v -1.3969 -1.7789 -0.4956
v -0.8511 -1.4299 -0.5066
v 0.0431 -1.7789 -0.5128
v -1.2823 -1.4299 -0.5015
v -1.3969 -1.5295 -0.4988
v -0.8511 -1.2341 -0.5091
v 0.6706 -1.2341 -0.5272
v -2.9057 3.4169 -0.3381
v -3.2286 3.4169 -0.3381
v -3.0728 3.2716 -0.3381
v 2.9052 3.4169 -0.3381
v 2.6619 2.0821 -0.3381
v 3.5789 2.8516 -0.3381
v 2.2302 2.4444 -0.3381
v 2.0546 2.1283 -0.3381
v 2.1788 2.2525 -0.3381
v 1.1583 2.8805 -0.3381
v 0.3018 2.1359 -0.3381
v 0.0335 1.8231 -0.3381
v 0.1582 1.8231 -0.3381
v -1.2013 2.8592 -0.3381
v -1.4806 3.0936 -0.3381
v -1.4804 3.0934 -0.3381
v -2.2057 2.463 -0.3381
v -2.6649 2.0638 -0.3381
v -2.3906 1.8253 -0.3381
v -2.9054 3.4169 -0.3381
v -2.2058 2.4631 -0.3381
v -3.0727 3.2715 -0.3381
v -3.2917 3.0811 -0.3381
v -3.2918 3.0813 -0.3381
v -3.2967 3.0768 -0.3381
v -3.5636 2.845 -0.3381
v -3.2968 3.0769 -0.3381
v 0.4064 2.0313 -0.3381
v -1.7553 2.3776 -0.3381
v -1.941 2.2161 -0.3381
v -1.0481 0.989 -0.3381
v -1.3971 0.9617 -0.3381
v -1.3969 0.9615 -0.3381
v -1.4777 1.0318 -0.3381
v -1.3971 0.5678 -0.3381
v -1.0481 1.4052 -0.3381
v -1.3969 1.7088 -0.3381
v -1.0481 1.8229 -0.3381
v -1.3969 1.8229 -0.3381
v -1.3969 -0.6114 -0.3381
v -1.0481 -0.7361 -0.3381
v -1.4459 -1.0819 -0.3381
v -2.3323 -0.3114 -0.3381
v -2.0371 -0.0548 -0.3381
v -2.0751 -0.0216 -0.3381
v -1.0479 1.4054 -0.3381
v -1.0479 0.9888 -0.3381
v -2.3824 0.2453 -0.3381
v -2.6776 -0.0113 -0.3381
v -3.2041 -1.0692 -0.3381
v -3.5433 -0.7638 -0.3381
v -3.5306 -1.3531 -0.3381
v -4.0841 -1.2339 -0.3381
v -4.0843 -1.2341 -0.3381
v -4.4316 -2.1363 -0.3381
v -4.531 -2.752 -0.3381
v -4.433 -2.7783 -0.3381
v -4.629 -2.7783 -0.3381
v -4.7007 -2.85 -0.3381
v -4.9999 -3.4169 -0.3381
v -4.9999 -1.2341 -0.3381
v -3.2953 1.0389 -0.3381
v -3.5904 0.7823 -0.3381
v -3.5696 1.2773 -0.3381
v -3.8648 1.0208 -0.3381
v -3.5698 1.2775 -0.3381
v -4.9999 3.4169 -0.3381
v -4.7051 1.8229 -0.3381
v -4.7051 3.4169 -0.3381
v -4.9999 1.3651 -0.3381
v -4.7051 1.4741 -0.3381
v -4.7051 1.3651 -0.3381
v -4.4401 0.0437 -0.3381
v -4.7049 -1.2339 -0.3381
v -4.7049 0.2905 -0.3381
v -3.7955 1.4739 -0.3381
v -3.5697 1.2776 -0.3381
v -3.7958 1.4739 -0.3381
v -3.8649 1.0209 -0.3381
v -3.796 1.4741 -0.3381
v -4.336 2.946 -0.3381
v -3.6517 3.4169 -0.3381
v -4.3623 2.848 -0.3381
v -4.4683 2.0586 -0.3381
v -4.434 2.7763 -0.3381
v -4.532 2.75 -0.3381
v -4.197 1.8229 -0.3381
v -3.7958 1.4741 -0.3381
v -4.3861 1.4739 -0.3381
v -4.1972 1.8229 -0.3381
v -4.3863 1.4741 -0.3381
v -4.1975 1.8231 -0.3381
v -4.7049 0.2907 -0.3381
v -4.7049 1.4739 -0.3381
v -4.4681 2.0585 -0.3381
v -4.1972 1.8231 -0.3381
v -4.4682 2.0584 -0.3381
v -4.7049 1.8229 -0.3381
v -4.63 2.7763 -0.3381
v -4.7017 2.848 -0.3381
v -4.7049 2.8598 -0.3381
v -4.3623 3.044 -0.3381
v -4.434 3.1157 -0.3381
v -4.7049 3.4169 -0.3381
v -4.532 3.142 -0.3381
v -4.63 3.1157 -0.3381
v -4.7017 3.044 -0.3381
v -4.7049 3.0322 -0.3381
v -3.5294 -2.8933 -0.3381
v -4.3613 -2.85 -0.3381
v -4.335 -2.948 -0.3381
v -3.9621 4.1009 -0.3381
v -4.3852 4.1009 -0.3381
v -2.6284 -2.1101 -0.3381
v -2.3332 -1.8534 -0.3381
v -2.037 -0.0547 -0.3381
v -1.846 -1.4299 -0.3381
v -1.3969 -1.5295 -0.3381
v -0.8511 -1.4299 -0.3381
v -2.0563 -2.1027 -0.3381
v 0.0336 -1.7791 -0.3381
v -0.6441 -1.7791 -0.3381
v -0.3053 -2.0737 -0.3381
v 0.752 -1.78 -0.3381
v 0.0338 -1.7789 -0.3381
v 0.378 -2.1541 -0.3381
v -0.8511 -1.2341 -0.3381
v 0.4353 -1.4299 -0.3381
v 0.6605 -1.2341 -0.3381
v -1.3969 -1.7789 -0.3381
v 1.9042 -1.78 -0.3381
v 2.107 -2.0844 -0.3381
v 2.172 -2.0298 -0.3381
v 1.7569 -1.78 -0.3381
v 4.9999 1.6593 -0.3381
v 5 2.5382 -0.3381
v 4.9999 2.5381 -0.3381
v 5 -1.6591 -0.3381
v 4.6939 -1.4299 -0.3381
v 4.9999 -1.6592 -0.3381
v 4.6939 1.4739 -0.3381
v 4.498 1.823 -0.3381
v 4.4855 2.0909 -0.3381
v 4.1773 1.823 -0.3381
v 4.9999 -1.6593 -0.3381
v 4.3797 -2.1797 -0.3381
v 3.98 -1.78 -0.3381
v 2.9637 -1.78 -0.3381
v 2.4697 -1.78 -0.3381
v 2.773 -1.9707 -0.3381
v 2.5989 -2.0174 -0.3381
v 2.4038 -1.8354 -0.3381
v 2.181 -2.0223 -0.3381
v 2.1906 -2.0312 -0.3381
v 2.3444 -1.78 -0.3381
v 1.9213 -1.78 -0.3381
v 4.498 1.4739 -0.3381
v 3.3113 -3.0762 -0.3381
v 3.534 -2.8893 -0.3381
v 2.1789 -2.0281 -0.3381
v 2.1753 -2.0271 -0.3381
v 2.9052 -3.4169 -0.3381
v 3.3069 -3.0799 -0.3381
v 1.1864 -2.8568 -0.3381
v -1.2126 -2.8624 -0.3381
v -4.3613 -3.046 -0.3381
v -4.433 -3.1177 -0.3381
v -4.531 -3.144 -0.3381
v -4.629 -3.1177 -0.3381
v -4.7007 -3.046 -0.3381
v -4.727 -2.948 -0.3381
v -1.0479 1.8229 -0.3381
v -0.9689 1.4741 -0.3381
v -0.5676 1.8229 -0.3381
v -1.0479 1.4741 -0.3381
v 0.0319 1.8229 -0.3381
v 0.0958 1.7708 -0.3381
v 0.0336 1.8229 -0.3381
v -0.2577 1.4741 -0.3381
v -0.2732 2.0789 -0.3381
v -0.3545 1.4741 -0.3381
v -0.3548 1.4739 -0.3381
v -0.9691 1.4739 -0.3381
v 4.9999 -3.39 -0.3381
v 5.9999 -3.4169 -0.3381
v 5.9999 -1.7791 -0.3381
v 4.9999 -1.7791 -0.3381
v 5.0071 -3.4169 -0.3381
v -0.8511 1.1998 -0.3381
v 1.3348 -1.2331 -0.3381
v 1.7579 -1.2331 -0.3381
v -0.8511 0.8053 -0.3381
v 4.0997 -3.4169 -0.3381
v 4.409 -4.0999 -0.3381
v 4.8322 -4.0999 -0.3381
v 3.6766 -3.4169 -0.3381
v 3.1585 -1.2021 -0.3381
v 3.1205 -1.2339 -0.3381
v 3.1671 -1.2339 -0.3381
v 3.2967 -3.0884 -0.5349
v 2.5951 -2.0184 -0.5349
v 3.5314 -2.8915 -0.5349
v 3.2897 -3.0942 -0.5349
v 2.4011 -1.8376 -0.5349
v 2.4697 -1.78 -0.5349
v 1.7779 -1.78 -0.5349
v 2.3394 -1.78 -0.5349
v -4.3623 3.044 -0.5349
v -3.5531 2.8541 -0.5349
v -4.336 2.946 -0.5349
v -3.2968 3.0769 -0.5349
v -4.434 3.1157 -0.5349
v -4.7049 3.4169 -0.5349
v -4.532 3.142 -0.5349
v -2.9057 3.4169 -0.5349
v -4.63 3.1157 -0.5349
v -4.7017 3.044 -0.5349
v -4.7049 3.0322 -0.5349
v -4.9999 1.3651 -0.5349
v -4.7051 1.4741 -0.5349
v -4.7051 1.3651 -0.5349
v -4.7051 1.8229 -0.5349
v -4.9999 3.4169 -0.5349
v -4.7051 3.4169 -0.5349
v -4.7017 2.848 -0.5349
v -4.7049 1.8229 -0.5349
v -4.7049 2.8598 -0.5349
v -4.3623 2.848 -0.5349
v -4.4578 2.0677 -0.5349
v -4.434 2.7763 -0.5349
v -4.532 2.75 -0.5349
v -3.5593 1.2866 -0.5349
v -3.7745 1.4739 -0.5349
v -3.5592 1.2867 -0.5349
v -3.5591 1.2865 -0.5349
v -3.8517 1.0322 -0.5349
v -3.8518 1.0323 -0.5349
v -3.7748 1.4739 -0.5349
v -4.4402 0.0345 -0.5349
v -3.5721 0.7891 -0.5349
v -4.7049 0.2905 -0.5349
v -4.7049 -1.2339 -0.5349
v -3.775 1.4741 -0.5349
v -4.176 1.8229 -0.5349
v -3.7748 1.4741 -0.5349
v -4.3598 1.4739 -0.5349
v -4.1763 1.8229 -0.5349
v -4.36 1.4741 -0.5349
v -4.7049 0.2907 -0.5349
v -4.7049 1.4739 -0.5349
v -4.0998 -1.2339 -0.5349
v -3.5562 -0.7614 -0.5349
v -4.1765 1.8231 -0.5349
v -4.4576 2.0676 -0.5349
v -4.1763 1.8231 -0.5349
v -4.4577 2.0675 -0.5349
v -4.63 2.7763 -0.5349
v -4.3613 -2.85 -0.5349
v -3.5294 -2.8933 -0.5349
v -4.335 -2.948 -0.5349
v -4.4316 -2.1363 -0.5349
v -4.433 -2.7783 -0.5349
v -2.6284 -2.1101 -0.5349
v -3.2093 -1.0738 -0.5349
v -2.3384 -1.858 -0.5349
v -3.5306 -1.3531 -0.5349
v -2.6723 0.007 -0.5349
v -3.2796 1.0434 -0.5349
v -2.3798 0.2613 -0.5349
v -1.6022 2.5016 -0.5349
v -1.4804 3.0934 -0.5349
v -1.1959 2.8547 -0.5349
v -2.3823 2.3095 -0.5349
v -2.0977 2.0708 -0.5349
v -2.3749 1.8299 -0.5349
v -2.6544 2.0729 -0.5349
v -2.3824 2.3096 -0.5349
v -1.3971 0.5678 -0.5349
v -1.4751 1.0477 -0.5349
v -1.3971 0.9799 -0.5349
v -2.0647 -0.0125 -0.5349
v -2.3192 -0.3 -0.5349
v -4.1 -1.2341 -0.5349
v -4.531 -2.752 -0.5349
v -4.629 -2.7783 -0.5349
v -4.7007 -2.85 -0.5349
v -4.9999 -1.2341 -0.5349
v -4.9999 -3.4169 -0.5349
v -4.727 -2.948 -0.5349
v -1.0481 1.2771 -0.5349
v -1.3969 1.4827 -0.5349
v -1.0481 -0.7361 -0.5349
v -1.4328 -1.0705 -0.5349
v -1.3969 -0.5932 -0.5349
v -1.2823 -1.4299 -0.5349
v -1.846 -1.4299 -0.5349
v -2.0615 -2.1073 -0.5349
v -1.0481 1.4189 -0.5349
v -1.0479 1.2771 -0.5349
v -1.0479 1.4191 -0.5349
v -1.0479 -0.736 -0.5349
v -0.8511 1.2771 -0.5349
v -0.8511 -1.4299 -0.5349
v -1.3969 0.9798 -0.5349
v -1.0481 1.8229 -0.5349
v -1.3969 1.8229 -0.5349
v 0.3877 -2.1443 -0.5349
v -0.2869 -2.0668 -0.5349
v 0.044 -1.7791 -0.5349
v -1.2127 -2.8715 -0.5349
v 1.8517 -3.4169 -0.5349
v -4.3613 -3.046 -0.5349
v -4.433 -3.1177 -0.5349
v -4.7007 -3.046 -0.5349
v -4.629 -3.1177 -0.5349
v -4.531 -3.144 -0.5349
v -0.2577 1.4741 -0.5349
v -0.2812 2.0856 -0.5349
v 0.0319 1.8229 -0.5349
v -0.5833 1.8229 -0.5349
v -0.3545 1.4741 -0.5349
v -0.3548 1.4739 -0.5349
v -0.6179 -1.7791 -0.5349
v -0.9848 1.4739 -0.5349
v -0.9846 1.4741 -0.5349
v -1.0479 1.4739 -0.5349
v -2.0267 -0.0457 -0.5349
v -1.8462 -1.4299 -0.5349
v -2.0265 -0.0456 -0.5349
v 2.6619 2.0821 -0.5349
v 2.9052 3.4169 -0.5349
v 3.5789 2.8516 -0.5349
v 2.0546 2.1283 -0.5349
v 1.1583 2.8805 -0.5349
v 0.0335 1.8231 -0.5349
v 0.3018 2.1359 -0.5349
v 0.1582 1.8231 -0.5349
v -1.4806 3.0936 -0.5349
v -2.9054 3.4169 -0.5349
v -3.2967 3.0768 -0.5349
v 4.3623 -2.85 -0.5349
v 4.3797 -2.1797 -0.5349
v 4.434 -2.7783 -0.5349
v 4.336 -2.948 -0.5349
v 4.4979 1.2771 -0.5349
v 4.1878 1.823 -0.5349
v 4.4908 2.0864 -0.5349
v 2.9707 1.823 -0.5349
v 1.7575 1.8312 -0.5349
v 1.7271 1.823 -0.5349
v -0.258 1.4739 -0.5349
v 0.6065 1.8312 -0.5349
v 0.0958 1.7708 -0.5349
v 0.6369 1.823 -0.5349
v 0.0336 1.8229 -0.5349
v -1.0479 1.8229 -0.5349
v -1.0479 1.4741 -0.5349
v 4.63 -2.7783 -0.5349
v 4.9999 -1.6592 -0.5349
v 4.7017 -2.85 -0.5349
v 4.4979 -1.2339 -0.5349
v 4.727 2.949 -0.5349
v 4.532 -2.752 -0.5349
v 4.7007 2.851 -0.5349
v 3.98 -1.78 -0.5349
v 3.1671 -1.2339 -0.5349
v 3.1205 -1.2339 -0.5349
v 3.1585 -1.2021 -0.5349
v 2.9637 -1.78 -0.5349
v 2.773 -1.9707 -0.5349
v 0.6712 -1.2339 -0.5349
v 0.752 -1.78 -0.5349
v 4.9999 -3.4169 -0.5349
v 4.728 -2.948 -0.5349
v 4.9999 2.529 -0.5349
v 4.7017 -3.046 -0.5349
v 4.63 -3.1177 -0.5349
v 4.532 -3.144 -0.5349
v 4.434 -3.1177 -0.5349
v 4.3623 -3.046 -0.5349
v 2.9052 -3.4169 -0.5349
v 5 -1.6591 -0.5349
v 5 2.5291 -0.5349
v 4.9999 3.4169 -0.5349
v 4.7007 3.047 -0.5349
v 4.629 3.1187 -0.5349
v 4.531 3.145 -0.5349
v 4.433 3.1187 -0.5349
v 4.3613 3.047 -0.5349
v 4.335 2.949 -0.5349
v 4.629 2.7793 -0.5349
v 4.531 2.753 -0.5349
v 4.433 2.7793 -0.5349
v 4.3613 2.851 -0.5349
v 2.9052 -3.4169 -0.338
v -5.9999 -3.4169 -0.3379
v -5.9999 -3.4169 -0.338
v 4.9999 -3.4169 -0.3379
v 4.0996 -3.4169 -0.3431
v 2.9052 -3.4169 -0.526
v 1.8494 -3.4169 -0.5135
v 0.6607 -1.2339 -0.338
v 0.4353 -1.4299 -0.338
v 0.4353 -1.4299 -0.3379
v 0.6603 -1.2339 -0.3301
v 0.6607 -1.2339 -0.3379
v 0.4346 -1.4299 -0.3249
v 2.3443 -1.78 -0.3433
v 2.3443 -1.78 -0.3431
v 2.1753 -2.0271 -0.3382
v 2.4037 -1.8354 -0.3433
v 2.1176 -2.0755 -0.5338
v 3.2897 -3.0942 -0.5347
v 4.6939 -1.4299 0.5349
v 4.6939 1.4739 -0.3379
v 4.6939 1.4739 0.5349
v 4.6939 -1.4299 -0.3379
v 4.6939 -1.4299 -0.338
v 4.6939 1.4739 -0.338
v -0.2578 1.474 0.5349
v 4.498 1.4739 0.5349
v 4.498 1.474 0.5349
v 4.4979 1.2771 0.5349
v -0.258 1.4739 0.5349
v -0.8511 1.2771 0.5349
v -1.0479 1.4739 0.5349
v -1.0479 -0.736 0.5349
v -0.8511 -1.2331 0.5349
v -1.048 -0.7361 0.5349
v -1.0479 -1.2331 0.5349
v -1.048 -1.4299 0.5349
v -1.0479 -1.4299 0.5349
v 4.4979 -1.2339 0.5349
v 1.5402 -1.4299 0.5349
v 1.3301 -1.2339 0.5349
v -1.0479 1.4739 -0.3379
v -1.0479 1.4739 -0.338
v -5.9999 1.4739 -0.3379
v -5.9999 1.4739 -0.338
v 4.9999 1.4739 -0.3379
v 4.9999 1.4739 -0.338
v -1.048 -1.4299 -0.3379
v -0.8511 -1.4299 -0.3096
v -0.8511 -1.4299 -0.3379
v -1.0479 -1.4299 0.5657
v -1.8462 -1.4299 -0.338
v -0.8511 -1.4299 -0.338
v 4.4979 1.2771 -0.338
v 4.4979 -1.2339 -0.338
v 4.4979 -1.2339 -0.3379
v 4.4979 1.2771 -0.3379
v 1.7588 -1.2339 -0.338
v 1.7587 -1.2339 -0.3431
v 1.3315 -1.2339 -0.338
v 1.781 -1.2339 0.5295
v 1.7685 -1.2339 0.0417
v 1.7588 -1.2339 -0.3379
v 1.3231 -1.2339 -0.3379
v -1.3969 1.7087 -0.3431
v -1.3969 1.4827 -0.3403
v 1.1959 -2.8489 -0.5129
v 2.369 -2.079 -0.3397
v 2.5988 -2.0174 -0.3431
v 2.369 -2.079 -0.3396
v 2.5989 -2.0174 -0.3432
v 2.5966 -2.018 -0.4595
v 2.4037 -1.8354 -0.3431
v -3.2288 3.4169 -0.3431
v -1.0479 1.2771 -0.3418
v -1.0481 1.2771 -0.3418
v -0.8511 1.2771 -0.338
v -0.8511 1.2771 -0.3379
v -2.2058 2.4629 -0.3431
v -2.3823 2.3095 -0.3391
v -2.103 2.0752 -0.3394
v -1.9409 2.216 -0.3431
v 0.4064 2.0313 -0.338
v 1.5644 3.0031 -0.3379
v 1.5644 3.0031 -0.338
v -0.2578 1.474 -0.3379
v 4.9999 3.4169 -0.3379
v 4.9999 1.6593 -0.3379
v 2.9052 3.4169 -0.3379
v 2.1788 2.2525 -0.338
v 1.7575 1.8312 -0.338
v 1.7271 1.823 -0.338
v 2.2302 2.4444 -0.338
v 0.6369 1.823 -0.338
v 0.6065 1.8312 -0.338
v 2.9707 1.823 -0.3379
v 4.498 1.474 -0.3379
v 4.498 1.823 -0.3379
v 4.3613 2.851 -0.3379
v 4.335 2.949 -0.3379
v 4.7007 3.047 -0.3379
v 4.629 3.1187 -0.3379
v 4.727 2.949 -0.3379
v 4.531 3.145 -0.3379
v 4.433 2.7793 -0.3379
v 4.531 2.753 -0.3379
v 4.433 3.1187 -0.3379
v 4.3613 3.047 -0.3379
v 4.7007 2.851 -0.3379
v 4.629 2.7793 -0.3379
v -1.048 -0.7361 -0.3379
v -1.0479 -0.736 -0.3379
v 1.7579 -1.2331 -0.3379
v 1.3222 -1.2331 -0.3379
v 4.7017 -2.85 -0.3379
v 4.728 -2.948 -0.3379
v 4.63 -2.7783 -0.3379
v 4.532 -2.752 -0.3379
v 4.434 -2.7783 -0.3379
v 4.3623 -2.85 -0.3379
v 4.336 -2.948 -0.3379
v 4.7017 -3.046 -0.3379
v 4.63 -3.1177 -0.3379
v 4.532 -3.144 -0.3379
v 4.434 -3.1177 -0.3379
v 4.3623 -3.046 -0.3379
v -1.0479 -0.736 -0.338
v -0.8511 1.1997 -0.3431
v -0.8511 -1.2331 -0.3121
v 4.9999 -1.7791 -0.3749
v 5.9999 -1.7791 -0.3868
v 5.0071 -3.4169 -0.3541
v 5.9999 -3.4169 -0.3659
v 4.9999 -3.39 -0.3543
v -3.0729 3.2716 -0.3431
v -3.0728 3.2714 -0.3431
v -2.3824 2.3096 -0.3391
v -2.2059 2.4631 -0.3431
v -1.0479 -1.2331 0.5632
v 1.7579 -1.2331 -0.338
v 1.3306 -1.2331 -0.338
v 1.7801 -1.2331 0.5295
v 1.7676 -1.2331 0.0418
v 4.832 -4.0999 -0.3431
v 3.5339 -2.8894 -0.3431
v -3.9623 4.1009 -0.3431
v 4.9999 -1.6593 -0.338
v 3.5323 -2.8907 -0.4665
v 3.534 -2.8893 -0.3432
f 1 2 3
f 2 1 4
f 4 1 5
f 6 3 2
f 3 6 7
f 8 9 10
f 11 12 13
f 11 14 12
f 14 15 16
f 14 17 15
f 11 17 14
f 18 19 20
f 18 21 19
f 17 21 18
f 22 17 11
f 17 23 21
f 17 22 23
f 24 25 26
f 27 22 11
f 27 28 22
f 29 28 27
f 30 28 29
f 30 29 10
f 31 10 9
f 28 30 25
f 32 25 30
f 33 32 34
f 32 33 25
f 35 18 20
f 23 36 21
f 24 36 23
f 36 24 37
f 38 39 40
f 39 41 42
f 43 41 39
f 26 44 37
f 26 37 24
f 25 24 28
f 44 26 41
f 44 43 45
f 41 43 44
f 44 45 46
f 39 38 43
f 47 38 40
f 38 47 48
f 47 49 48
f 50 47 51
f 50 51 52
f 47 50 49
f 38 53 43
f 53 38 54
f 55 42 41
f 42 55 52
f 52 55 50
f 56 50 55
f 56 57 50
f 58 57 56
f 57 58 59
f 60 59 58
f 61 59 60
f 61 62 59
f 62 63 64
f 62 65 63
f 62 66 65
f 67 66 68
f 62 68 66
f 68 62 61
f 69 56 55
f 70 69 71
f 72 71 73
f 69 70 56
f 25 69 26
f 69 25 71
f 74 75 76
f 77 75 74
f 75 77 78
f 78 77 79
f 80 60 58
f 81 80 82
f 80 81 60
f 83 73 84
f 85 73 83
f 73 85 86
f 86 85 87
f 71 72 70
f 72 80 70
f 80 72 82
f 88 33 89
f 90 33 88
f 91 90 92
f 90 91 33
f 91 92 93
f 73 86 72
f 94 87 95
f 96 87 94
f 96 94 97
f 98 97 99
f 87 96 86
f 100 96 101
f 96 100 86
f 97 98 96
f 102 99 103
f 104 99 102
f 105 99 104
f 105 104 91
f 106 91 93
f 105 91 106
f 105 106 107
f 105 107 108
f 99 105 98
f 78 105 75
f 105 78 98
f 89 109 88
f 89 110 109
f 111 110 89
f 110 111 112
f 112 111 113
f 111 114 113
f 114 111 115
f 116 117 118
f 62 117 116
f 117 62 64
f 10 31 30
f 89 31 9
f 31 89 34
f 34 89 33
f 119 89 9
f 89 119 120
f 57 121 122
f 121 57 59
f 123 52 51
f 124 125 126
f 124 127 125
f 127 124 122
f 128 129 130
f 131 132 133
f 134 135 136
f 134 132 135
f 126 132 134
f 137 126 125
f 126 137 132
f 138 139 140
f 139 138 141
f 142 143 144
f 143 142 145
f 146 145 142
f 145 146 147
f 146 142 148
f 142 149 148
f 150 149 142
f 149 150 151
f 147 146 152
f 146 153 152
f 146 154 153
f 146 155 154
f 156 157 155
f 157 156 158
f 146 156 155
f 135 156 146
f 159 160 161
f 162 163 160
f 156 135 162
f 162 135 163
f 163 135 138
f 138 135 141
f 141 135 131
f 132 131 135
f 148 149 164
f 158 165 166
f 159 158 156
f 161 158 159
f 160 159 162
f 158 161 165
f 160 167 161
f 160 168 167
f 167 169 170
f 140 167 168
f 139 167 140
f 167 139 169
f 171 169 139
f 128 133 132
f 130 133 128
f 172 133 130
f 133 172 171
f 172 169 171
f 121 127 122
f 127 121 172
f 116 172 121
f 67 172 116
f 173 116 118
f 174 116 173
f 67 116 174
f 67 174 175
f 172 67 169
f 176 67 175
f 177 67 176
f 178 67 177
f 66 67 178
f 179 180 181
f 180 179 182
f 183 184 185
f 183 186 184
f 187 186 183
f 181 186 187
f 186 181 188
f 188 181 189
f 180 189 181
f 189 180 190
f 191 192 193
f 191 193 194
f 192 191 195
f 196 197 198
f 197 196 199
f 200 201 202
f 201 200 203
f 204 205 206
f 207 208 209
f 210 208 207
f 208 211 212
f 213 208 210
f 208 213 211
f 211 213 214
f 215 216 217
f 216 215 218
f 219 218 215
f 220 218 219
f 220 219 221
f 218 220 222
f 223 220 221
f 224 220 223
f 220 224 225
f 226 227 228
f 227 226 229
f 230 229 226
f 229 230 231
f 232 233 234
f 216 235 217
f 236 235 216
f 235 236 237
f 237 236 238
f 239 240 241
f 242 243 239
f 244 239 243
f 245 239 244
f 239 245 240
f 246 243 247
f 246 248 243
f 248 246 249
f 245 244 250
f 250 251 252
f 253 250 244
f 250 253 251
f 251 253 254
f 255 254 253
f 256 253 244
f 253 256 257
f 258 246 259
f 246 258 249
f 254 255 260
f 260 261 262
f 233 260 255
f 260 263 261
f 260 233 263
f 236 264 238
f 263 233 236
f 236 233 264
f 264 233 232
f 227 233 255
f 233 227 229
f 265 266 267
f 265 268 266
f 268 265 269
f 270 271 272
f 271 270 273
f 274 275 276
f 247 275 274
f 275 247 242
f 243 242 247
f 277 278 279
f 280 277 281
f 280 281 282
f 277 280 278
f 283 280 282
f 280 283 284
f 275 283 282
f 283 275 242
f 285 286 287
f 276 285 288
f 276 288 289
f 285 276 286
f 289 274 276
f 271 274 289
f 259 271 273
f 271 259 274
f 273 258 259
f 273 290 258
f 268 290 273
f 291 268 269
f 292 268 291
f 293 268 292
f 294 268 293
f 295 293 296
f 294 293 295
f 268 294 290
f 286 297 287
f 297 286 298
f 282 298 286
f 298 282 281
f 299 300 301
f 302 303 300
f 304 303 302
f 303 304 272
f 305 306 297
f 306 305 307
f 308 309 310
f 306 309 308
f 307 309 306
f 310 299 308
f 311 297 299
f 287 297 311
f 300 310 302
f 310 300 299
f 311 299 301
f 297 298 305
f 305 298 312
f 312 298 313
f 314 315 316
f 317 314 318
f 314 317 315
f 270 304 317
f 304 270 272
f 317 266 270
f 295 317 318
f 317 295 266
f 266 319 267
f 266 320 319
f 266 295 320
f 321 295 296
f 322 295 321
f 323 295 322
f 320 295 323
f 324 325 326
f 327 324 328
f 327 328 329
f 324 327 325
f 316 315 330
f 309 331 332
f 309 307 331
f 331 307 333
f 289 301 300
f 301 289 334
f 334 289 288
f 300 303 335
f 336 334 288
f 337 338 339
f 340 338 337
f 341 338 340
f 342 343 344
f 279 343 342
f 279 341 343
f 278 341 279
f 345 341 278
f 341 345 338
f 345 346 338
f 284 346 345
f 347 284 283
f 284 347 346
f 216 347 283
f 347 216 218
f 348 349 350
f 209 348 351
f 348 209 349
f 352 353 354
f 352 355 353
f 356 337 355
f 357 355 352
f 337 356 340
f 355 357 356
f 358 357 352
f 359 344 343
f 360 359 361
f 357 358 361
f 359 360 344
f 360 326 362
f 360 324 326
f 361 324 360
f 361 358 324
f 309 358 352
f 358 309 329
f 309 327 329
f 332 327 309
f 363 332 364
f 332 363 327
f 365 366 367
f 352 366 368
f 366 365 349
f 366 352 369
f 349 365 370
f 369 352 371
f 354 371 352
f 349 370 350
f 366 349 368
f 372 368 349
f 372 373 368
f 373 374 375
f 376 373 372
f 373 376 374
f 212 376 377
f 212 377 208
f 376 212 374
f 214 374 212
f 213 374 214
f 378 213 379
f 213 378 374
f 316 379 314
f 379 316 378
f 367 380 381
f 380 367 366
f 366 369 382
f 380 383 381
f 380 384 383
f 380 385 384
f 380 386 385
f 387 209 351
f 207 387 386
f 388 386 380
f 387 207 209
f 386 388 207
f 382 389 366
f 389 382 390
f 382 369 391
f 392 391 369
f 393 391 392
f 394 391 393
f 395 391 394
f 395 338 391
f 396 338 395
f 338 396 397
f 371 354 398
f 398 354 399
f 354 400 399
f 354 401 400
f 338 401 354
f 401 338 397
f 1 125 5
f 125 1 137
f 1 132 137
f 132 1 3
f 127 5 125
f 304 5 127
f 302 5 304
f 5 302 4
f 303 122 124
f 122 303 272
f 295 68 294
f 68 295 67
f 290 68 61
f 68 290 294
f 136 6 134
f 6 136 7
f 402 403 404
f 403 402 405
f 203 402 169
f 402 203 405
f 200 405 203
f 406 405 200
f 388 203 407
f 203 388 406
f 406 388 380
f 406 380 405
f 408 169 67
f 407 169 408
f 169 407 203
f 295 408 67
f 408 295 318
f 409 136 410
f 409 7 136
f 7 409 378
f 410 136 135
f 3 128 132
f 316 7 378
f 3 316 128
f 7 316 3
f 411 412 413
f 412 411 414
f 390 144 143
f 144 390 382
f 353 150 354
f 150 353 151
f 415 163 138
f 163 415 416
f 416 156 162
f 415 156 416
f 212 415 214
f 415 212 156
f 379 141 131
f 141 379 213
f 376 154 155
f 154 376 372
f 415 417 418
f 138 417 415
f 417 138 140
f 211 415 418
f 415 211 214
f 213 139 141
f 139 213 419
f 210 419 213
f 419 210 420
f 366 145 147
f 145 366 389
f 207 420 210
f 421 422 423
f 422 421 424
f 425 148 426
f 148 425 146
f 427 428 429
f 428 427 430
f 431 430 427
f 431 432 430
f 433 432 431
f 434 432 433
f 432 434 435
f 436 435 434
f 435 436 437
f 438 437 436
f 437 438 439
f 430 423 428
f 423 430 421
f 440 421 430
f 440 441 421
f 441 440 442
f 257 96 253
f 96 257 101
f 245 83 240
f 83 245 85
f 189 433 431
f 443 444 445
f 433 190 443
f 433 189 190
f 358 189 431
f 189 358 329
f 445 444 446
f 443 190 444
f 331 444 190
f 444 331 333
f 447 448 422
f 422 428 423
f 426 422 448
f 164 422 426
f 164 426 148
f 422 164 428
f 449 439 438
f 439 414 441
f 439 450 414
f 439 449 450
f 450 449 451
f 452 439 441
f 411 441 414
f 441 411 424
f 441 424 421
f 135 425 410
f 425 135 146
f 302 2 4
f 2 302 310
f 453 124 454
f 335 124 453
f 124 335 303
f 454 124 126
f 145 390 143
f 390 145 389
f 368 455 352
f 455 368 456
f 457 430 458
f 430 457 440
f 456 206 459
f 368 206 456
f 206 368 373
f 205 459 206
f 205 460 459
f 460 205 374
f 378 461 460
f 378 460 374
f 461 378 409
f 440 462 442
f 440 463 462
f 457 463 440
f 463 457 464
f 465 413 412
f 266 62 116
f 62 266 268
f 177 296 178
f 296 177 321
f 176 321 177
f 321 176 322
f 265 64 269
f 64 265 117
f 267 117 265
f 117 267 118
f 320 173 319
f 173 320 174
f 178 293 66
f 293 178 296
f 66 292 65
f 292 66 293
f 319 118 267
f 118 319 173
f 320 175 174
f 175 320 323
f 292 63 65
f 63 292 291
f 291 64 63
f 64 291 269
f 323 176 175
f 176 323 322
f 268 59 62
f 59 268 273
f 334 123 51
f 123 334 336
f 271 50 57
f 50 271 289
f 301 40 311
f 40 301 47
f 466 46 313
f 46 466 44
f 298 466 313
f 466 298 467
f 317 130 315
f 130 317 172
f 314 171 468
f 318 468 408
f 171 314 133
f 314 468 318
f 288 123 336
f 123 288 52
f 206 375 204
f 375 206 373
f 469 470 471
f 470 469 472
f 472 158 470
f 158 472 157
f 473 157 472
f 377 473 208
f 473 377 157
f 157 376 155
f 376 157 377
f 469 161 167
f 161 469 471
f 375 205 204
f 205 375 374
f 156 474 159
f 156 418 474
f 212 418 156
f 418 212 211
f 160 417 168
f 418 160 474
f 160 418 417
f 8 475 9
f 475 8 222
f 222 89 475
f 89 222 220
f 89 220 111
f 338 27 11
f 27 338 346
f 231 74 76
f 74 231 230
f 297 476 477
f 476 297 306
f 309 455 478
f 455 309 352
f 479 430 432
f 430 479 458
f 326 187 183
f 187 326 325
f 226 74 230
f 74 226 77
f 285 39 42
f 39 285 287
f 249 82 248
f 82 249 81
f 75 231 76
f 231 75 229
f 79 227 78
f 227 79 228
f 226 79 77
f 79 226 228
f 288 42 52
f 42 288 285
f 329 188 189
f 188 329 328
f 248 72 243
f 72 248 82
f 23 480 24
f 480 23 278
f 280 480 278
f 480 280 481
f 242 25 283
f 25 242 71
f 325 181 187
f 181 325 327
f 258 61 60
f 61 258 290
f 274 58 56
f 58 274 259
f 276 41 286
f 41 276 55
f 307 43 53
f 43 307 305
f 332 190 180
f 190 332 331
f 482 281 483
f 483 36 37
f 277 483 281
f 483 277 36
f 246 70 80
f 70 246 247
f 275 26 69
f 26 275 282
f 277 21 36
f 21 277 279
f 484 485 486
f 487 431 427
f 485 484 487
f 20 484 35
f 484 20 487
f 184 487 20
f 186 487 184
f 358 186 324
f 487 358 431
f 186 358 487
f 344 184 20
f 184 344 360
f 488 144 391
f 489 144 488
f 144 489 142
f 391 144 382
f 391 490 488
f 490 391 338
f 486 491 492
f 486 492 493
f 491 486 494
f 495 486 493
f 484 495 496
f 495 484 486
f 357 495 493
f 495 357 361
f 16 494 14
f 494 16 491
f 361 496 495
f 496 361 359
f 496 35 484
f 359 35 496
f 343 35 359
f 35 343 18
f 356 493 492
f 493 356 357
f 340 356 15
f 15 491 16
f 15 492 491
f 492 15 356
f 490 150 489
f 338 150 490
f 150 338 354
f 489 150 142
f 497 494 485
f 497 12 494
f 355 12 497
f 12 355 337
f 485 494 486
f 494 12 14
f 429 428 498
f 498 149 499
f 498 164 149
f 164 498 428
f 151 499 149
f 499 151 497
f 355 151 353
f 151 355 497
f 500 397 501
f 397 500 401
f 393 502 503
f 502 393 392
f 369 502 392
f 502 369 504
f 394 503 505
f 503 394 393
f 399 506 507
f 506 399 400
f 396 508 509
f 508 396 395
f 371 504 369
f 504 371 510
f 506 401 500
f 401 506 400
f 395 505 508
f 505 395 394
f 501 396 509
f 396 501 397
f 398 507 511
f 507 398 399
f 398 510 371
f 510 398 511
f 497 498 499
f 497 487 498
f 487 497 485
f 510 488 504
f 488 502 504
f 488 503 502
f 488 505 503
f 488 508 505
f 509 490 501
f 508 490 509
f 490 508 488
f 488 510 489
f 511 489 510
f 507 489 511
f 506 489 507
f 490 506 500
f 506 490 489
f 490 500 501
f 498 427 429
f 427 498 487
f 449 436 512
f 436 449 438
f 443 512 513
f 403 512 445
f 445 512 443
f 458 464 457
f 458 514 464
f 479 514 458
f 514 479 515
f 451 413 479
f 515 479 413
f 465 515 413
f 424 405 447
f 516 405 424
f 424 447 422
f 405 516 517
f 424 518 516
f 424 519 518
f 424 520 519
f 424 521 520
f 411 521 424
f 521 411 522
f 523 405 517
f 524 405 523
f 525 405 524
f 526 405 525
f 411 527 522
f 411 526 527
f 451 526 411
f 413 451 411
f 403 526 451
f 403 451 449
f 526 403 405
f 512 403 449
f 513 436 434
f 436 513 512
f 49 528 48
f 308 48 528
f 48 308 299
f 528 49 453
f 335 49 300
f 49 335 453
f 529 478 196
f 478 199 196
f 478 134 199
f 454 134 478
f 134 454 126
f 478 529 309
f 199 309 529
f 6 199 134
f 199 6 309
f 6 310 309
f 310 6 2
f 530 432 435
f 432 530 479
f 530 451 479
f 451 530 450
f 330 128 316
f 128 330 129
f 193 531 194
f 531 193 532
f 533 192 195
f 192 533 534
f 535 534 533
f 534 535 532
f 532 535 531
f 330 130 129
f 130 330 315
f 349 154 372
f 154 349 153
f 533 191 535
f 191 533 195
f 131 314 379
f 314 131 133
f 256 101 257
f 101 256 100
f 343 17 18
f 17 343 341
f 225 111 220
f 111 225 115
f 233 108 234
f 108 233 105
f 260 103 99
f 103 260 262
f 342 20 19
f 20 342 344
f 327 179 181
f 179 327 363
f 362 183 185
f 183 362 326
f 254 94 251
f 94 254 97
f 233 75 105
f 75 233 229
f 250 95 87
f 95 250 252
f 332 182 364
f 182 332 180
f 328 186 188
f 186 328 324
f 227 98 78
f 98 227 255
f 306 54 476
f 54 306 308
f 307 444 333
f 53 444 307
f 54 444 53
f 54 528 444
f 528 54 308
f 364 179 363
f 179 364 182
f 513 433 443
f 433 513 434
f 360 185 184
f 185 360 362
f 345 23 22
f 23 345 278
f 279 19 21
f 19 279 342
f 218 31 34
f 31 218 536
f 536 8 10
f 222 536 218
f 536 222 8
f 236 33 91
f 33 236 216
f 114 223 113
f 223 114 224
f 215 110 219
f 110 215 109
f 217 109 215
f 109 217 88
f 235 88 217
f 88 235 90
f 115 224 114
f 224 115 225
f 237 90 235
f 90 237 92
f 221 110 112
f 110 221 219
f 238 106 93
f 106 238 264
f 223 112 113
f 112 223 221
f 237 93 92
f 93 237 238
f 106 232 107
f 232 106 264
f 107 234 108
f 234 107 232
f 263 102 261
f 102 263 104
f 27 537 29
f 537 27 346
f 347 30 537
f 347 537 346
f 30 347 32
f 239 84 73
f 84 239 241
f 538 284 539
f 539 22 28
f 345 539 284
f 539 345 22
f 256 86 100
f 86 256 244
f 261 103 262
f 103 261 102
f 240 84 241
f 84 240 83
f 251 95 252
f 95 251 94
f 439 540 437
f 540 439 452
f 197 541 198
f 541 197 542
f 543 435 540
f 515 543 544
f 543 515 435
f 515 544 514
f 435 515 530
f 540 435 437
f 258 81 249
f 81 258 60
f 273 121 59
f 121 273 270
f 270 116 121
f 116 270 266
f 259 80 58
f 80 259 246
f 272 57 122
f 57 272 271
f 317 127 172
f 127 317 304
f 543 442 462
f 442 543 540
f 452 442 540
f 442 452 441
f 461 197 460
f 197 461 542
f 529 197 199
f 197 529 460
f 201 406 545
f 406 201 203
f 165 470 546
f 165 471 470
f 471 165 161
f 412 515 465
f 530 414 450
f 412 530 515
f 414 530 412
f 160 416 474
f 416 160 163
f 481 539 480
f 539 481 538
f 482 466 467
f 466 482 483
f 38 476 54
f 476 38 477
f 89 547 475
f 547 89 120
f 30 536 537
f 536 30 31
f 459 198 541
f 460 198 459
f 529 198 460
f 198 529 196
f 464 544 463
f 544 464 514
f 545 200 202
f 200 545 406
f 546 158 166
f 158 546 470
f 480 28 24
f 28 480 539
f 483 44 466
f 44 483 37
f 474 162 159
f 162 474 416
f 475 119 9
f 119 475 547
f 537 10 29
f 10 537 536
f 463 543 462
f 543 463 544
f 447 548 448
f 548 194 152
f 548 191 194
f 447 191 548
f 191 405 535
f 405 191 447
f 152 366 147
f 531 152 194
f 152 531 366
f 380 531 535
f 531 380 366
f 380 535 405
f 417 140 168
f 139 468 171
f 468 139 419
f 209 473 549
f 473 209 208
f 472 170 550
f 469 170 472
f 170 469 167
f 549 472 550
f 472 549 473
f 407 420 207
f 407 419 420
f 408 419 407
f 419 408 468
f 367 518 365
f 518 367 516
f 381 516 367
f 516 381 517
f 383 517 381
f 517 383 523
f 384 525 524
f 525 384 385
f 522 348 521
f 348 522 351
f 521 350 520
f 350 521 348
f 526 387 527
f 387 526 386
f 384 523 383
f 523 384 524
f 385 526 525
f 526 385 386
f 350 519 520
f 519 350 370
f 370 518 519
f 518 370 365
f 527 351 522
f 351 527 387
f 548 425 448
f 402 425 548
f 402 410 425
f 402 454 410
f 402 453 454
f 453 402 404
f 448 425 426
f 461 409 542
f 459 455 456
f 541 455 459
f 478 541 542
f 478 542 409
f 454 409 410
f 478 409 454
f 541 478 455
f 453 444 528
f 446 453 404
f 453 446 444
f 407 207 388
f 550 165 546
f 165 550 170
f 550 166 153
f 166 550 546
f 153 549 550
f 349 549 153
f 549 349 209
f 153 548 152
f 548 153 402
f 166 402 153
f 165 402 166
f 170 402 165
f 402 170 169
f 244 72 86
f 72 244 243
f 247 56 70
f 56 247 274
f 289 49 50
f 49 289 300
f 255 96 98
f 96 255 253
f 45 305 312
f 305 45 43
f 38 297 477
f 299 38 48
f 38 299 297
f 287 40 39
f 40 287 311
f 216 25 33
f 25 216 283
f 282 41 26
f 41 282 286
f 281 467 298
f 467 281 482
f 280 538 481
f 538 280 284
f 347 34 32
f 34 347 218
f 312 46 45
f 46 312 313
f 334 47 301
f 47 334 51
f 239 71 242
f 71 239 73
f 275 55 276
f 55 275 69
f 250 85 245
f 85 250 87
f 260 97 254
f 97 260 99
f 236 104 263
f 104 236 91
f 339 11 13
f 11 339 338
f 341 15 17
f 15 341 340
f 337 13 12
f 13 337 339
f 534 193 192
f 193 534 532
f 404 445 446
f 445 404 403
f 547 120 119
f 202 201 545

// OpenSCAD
intersection() {
  translate([0, 0.0005, 0])
  cube(size = [11.9998, 8.2008, 1.2838], center = true);

  union() {
    intersection() {
      translate([6.55, -2.3255, -0.4365])
      cube(size = [23.0998, 2.1828, 0.1968], center = true);
    
      union() {
        translate([-6.36213, 7.3188, -8.7825])
        rotate([-180, 0, 41])
        cube(size = [36.1998, 16.8048, 18.6348], center = true);
      
        intersection() {
          translate([-6.07303, -6.51253, -0.281133])
          rotate([-1, 0, -43])
          cube(size = [36.1998, 18.4028, 0.1968], center = true);
        
          translate([8.3515, -1.506, -0.4365])
          cube(size = [19.4968, 0.5458, 0.1968], center = true);
        }
      
        translate([0.0347711, -0.0399996, -9.219])
        rotate([-180, 0, 41])
        cube(size = [36.1998, 0.3698, 17.7618], center = true);
      }
    }
  
    intersection() {
      union() {
        difference() {
          translate([6.37694, -7.33583, 0.339433])
          rotate([178, 0, 41])
          cube(size = [36.1998, 16.7478, 36.1998], center = true);
        
          translate([-6.55, -9.94, -8.7825])
          cube(size = [23.0999, 16.3199, 18.6349], center = true);
        }
      
        intersection() {
          translate([-6.17757, -6.62463, -9.0623])
          rotate([-1, 0, -43])
          cube(size = [36.1998, 18.4028, 17.7618], center = true);
        
          translate([5.85252, 6.73255, 0.623797])
          rotate([4, 0, -41])
          cube(size = [36.1998, 18.3128, 36.1998], center = true);
        }
      }
    
      difference() {
        union() {
          translate([1.47873, -1.76229, -0.4365])
          rotate([-180, 0, 40])
          cube(size = [36.1998, 4.3688, 0.1968], center = true);
        
          translate([-6.703, 0.022, 0])
          cube(size = [22.7938, 2.9038, 1.0698], center = true);
        }
      
        union() {
          translate([11.55, 0, 0])
          cube(size = [13.0999, 6.8339, 1.0699], center = true);
        
          translate([-6.801, 0.2945, 0])
          cube(size = [22.5979, 3.0569, 1.0699], center = true);
        }
      }
    }
  
    intersection() {
      union() {
        translate([-0.888632, 1.02225, -0.4365])
        rotate([-180, 0, 41])
        cube(size = [36.1998, 0.1188, 0.1968], center = true);
      
        translate([8.3515, 0, -0.4365])
        cube(size = [19.4968, 36.1998, 0.1968], center = true);
      
        difference() {
          translate([-7.25868, -8.65056, -0.4365])
          rotate([0, 0, -40])
          cube(size = [36.1998, 13.6148, 0.1968], center = true);
        
          translate([-4.531, -2.948, -0.4365])
          cylinder(h = 0.1969, r1 = 0.196, r2 = 0.196, center = true, $fn = 12);
        }
      }
    
      union() {
        translate([6.37694, -7.33583, 0.339433])
        rotate([178, 0, 41])
        cube(size = [36.1998, 16.7478, 36.1998], center = true);
      
        translate([-0.506806, 0.583013, 1.11022e-16])
        rotate([-180, 0, 41])
        cube(size = [36.1998, 1.2828, 1.0698], center = true);
      }
    
      difference() {
        translate([6.55, 7.3415, -8.7825])
        cube(size = [23.0998, 21.5168, 18.6348], center = true);
      
        translate([5.4654, 6.28723, 0.582536])
        rotate([4, 0, -41])
        cube(size = [36.1999, 19.4979, 36.1999], center = true);
      }
    }
  
    intersection() {
      translate([2.369, -1.271, -0.4365])
      cylinder(h = 0.1968, r1 = 0.808, r2 = 0.808, center = true, $fn = 12);
    
      translate([2.38988, -2.84815, 8.7825])
      rotate([-180, 0, 40])
      cube(size = [36.1998, 1.5338, 18.6348], center = true);
    }
  
    intersection() {
      union() {
        translate([-2.926, 2.347, -0.4365])
        cube(size = [4.1478, 2.1398, 0.1968], center = true);
      
        intersection() {
          translate([6.6975, 2.347, -0.4365])
          cube(size = [22.8048, 2.1398, 0.1968], center = true);
        
          translate([0.531907, 0.633902, -9.219])
          rotate([0, 0, -40])
          cube(size = [36.1998, 1.1788, 17.7618], center = true);
        }
      
        translate([-3.051, -7.3415, -0.4365])
        cube(size = [3.3078, 21.5168, 0.1968], center = true);
      }
    
      difference() {
        union() {
          translate([-4.8525, 2.391, 8.7825])
          cube(size = [0.2948, 2.0518, 18.6348], center = true);
        
          translate([-1.52567, 1.75508, 3.33067e-16])
          rotate([-180, 0, 41])
          cube(size = [36.1998, 1.9608, 1.0698], center = true);
        }
      
        intersection() {
          translate([-6.49526, 7.47194, 0.518859])
          rotate([-177, 1.20742e-06, 41])
          cube(size = [36.1999, 16.3719, 36.1999], center = true);
        
          translate([4.96465, -5.71118, 0.264259])
          rotate([178, 0, 41])
          cube(size = [36.1999, 21.0559, 36.1999], center = true);
        }
      }
    }
  
    difference() {
      difference() {
        intersection() {
          translate([1.02557, -1.22222, -2.22045e-16])
          rotate([-180, 0, 40])
          cube(size = [36.1998, 5.7808, 1.0698], center = true);
        
          translate([-6.55, 2.347, 8.7825])
          cube(size = [23.0998, 2.1398, 18.6348], center = true);
        }
      
        intersection() {
          translate([-6.55, 2.62, -0.4365])
          cube(size = [23.0999, 1.5939, 0.1969], center = true);
        
          translate([1.182, 2.828, 0])
          cylinder(h = 1.0699, r1 = 1.151, r2 = 1.151, center = true, $fn = 12);
        }
      }
    
      union() {
        difference() {
          translate([2.50398, 2.98413, -8.7825])
          rotate([0, 0, -40])
          cube(size = [36.1999, 1.1789, 18.6349], center = true);
        
          translate([-6.801, -0.797, 0])
          cube(size = [22.598, 5.24, 1.07], center = true);
        }
      
        translate([4.531, 2.949, 0])
        cylinder(h = 36.1999, r1 = 0.196, r2 = 0.196, center = true, $fn = 12);
      
        translate([-6.55, 2.4455, 8.881])
        cube(size = [23.0999, 1.9429, 18.4379], center = true);
      }
    }
  
    difference() {
      translate([-2.778, 8.335, 0])
      cube(size = [3.8538, 19.5298, 1.0698], center = true);
    
      union() {
        translate([-2.8765, 7.3415, 0.0985])
        cube(size = [3.6569, 21.5169, 0.8729], center = true);
      
        translate([-5.98063, 6.87993, 1.11022e-15])
        rotate([-180, 0, 41])
        cube(size = [36.1999, 17.9679, 1.0699], center = true);
      }
    }
  
    difference() {
      difference() {
        translate([6.6975, -2.598, -0.4365])
        cube(size = [22.8048, 1.6378, 0.1968], center = true);
      
        translate([6.26892, 6.72259, -0.597013])
        rotate([-1, 0, -43])
        cube(size = [36.1999, 17.7959, 0.1969], center = true);
      }
    
      union() {
        translate([-6.49903, -7.47627, -0.866677])
        rotate([5, 0, -41])
        cube(size = [36.1999, 16.3119, 36.1999], center = true);
      
        translate([2.366, -3.98, -9.219])
        cylinder(h = 17.7619, r1 = 2.792, r2 = 2.792, center = true, $fn = 12);
      }
    }
  
    intersection() {
      union() {
        translate([6.55, 1.6485, -0.4365])
        cube(size = [23.0998, 0.3488, 0.1968], center = true);
      
        intersection() {
          translate([6.6975, -8.313, 0])
          cube(size = [22.8048, 19.5738, 1.0698], center = true);
        
          translate([4.46612, -5.13769, 8.7825])
          rotate([-180, 0, 41])
          cube(size = [36.1998, 22.5848, 18.6348], center = true);
        }
      
        difference() {
          translate([6.6975, 2.62, -8.7825])
          cube(size = [22.8048, 1.5938, 18.6348], center = true);
        
          difference() {
            translate([1.182, 2.828, 0])
            cylinder(h = 36.1999, r1 = 1.151, r2 = 1.151, center = true, $fn = 12);
          
            translate([-6.40117, 7.3637, -9.219])
            rotate([-180, 0, 41])
            cube(size = [36.2, 16.686, 17.762], center = true);
          }
        }
      }
    
      union() {
        difference() {
          translate([8.526, 1.55, 8.7825])
          cube(size = [19.1478, 0.5458, 18.6348], center = true);
        
          translate([6.27296, 7.47583, 8.7825])
          rotate([0, 0, -40])
          cube(size = [36.1999, 16.6819, 18.6349], center = true);
        }
      
        difference() {
          union() {
            translate([1.51826, 1.8094, -0.4365])
            rotate([0, 0, -40])
            cube(size = [36.1998, 1.8878, 0.1968], center = true);
          
            translate([-7.40855, 8.52256, -0.4365])
            rotate([-180, 0, 41])
            cube(size = [36.1998, 13.6148, 0.1968], center = true);
          }
        
          union() {
            translate([-4.532, 2.946, 8.7825])
            cylinder(h = 18.6349, r1 = 0.196, r2 = 0.196, center = true, $fn = 12);
          
            translate([8.3515, -8.1385, -0.4365])
            cube(size = [19.4969, 19.9229, 0.1969], center = true);
          }
        }
      
        difference() {
          translate([-2.55568, 2.93997, -0.4365])
          rotate([-180, 0, 41])
          cube(size = [36.1998, 1.1788, 0.1968], center = true);
        
          translate([-0.527168, -0.606438, -0.0561888])
          rotate([4, 0, -41])
          cube(size = [36.1999, 1.1849, 36.1999], center = true);
        }
      }
    }
  
    intersection() {
      union() {
        translate([8.526, -1.3315, 0])
        cube(size = [19.1478, 0.1968, 36.1998], center = true);
      
        translate([-2.778, 8.433, -0.4365])
        cube(size = [3.8538, 19.3338, 0.1968], center = true);
      
        translate([4.7547, 5.66643, -0.4365])
        rotate([0, 0, -40])
        cube(size = [36.1998, 21.4058, 0.1968], center = true);
      
        translate([5.89403, -6.78031, -0.4365])
        rotate([-180, 0, 41])
        cube(size = [36.1998, 18.2318, 0.1968], center = true);
      }
    
      union() {
        difference() {
          translate([-2.8765, 7.3415, -0.4365])
          cube(size = [3.6568, 21.5168, 0.1968], center = true);
        
          translate([5.07394, 5.63518, -0.2648])
          rotate([-2, 0, -42])
          cube(size = [36.1999, 21.0249, 36.1999], center = true);
        }
      
        translate([-6.06667, -6.5057, 0.253785])
        rotate([-1, 0, -43])
        cube(size = [36.1998, 18.4028, 0.8728], center = true);
      }
    }
  
    difference() {
      intersection() {
        translate([-6.55, -2.4235, -0.4365])
        cube(size = [23.0998, 1.9868, 0.1968], center = true);
      
        translate([6.76566, -8.063, -0.4365])
        rotate([-180, 0, 40])
        cube(size = [36.1998, 15.1488, 0.1968], center = true);
      }
    
      difference() {
        translate([2.366, -3.98, -9.219])
        cylinder(h = 17.7619, r1 = 2.792, r2 = 2.792, center = true, $fn = 12);
      
        translate([-6.07303, -6.51253, -0.281133])
        rotate([-1, 0, -43])
        cube(size = [36.2, 18.403, 0.197], center = true);
      }
    }
  
    difference() {
      difference() {
        translate([-6.55, -0.9715, 0])
        cube(size = [23.0998, 4.8908, 1.0698], center = true);
      
        translate([4.532, -2.948, 0])
        cylinder(h = 36.1999, r1 = 0.196, r2 = 0.196, center = true, $fn = 12);
      }
    
      union() {
        translate([-4.37578, 5.21485, -0.4365])
        rotate([-180, 0, 40])
        cube(size = [36.1999, 22.5849, 0.1969], center = true);
      
        translate([-4.37578, -5.21485, 0.0985])
        rotate([0, 0, -40])
        cube(size = [36.1999, 22.5849, 0.8729], center = true);
      }
    }
  
    intersection() {
      union() {
        intersection() {
          translate([5.33046, 6.13199, 0.710842])
          rotate([5, 0, -41])
          cube(size = [36.1998, 19.8878, 36.1998], center = true);
        
          translate([-2.8765, -7.3415, -0.4365])
          cube(size = [3.6568, 21.5168, 0.1968], center = true);
        }
      
        intersection() {
          translate([5.4654, 6.28723, 0.582536])
          rotate([4, 0, -41])
          cube(size = [36.1998, 19.4978, 36.1998], center = true);
        
          translate([-0.9495, -8.313, 0])
          cube(size = [0.1968, 19.5738, 1.0698], center = true);
        }
      }
    
      union() {
        translate([8.3515, -8.1385, -8.7825])
        cube(size = [19.4968, 19.9228, 18.6348], center = true);
      
        intersection() {
          translate([5.85252, 6.73255, 0.623797])
          rotate([4, 0, -41])
          cube(size = [36.1998, 18.3128, 36.1998], center = true);
        
          translate([-5.74074, -6.84154, -9.219])
          rotate([0, 0, -40])
          cube(size = [36.1998, 18.3378, 17.7618], center = true);
        }
      
        translate([-6.38034, -7.33974, -0.680056])
        rotate([4, 0, -41])
        cube(size = [36.1998, 16.7018, 36.1998], center = true);
      }
    }
  
    difference() {
      intersection() {
        translate([-6.55, -7.3415, -0.4365])
        cube(size = [23.0998, 21.5168, 0.1968], center = true);
      
        translate([2.38988, 2.84815, 0])
        rotate([0, 0, -40])
        cube(size = [36.1998, 1.5338, 1.0698], center = true);
      }
    
      intersection() {
        translate([-6.801, 1.0915, 0])
        cube(size = [22.5979, 4.6509, 1.0699], center = true);
      
        translate([5.85451, -6.97713, -9.219])
        rotate([-180, 0, 40])
        cube(size = [36.1999, 17.9839, 17.7619], center = true);
      }
    }
  }
}
